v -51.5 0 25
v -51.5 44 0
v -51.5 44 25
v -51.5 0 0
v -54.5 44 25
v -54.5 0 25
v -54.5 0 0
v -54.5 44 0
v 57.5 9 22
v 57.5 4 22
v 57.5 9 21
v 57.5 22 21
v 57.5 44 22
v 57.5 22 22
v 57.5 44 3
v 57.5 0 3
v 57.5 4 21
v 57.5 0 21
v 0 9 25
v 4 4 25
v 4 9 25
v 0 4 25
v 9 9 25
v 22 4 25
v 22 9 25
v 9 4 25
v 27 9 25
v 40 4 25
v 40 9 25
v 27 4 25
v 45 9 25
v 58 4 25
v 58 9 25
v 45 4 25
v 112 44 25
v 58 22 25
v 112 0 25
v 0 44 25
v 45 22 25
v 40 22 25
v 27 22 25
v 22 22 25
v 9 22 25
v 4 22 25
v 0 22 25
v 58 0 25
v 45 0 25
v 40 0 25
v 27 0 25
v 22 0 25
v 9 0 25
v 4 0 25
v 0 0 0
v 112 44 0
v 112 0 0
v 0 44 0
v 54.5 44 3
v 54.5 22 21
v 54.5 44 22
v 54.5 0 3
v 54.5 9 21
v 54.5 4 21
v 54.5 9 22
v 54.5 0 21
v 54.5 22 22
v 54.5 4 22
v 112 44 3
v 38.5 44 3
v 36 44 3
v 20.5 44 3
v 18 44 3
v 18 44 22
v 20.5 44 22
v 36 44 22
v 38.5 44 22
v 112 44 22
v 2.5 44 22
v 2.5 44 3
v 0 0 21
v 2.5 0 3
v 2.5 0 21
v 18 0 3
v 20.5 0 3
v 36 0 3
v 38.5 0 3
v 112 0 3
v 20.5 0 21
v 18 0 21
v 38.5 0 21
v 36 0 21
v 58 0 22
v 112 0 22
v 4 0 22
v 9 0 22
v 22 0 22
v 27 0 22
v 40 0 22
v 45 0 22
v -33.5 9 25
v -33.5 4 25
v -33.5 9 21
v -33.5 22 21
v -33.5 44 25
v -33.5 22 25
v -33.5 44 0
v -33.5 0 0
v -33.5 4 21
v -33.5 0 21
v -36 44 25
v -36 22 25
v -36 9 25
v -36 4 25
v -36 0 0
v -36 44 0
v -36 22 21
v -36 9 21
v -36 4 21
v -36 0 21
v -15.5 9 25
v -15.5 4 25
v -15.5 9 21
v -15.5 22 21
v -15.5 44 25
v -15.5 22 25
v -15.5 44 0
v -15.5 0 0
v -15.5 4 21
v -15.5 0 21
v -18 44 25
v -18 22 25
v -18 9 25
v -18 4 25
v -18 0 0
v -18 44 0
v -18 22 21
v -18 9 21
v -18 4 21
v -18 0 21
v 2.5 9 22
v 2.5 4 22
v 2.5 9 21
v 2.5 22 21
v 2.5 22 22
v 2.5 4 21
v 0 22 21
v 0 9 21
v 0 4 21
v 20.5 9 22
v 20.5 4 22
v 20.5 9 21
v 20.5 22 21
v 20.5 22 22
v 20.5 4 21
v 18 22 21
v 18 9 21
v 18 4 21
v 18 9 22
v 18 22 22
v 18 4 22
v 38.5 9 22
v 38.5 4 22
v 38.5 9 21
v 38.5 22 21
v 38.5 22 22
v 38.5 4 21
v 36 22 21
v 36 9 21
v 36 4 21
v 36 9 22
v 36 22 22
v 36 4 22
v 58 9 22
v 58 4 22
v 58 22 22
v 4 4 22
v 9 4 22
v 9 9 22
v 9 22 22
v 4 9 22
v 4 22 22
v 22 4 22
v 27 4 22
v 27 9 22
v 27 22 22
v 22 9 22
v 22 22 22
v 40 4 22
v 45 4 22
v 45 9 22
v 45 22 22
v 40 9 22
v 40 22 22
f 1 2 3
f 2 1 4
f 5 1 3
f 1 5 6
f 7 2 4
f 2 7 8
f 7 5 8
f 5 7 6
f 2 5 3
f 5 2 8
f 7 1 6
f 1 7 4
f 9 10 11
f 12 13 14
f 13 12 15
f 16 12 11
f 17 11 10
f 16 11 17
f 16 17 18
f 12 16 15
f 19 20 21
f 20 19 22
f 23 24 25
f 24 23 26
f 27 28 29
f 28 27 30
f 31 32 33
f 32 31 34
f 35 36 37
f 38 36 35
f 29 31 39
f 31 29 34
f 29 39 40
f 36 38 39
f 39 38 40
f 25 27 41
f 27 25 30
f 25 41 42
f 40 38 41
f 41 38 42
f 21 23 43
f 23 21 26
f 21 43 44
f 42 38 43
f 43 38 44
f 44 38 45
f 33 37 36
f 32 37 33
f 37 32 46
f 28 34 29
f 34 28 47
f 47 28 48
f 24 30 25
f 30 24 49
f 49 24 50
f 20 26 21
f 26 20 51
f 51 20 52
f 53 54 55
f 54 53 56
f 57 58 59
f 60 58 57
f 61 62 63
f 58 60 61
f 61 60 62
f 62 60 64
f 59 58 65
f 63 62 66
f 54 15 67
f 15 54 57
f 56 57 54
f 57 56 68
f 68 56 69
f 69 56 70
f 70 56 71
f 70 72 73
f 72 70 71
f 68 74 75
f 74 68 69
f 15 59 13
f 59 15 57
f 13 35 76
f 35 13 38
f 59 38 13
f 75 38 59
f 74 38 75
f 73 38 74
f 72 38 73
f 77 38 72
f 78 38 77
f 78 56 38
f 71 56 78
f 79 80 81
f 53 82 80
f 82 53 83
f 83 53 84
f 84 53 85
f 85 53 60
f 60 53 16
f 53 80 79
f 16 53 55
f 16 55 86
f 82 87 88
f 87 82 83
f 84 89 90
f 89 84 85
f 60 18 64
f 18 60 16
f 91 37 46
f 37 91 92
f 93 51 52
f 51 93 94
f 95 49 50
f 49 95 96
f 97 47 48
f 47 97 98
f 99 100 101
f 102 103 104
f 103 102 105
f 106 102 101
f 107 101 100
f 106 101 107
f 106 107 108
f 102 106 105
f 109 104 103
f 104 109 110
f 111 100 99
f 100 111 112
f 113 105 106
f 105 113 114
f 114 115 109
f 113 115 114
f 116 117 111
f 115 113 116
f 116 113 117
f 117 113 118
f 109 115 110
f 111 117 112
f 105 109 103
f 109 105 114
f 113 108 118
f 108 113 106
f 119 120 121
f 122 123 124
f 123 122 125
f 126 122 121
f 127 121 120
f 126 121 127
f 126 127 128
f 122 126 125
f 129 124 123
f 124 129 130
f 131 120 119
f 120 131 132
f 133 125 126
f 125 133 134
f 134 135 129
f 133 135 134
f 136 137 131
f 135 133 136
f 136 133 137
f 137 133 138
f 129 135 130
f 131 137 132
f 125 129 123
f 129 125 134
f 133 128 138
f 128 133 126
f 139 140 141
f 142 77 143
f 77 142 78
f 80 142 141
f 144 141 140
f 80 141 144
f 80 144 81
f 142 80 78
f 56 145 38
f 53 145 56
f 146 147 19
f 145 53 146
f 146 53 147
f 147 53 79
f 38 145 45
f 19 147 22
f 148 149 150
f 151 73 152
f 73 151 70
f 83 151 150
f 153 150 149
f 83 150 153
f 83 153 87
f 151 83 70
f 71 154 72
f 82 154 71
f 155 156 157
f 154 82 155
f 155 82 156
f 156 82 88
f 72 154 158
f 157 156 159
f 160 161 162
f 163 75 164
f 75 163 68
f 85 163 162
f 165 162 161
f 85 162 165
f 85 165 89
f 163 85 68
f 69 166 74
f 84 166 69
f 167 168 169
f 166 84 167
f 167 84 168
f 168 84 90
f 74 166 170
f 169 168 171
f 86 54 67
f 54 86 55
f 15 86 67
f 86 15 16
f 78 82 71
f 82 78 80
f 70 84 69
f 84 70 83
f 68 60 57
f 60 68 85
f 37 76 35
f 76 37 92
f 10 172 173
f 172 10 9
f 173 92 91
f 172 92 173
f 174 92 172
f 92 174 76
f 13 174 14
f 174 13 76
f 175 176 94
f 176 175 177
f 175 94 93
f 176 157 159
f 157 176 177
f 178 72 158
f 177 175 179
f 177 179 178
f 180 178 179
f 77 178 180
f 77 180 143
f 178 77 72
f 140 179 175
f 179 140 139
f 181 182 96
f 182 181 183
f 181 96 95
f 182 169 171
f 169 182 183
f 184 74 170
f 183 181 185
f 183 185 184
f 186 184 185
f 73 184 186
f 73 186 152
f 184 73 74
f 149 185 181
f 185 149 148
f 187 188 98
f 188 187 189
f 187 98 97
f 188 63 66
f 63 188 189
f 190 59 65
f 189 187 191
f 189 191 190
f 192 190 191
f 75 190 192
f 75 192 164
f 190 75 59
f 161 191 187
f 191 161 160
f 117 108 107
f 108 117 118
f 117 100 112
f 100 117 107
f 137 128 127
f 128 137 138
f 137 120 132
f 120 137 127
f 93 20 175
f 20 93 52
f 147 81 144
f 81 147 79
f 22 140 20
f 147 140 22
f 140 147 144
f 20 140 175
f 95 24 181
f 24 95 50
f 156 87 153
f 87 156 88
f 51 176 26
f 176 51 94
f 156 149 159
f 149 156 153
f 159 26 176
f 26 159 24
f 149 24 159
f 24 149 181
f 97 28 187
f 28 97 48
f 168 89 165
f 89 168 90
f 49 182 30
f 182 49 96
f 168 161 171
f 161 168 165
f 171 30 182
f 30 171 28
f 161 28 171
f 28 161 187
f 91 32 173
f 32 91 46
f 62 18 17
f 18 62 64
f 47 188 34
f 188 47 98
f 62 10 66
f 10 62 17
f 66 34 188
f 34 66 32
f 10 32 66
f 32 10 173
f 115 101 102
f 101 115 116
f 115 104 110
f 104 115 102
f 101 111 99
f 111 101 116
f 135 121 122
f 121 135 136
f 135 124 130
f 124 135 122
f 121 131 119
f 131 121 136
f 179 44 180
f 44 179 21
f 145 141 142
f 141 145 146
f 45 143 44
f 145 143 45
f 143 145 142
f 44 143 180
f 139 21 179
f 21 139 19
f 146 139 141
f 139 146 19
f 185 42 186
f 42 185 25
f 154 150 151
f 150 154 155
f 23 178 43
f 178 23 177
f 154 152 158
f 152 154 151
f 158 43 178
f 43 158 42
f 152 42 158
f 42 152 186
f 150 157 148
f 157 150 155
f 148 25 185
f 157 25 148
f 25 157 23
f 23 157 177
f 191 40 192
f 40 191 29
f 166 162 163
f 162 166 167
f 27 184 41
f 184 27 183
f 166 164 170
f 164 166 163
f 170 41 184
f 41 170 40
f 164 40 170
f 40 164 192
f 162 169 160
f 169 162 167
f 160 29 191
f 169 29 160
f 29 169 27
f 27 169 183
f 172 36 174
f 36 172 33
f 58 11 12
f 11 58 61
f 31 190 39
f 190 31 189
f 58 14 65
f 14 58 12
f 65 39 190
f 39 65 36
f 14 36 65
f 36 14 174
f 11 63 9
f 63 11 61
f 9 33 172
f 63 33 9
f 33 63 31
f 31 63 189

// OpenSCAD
// 12-cuvette rack, printed standing on its base (z = 0 to 25)
// All dimensions in mm, measured with calipers.

// --- Plate dimensions (base & deck) ---
plate_x = 112;   // X extent of base and deck plates
plate_y = 44;    // Y extent of base and deck plates
base_t  = 3;     // base plate thickness (z 0..3)
deck_t  = 3;     // deck plate thickness (z 22..25)
deck_z  = 22;    // bottom of deck plate
total_h = 25;    // overall height of the rack

// --- Wall / rib dimensions ---
end_wall_t  = 3;    // thickness of the two end walls (along X)
rib_t       = 2.5;  // thickness of the five internal ribs (along X)
rib_x       = [-36, -18, 0, 18, 36]; // X centres of the five ribs

// --- Cuvette through-holes in the deck ---
hole_size = 13;    // 13 x 13 mm square through-holes
hole_pitch = 18;   // 18 mm centre-to-centre in both X and Y
hole_rows  = 2;    // rows along Y
hole_cols  = 6;    // columns along X

$fn = 64;

// ---------------------------------------------------------------------------
// Base plate (z 0..3), centred on origin in X and Y
// ---------------------------------------------------------------------------
module base_plate() {
    translate([0, 0, 0])
        cube([plate_x, plate_y, base_t], center = [true, true, false]);
}

// ---------------------------------------------------------------------------
// Deck plate (z 22..25), centred on origin in X and Y
// ---------------------------------------------------------------------------
module deck_plate() {
    translate([0, 0, deck_z])
        cube([plate_x, plate_y, deck_t], center = [true, true, false]);
}

// ---------------------------------------------------------------------------
// Seven upright walls, full height (z 0..25), full Y depth
// ---------------------------------------------------------------------------
module walls() { union() {
    // Two 3 mm end walls flush with the short ends
    for (sx = [-1, 1]) {
        x_c = sx * (plate_x / 2 - end_wall_t / 2);
        translate([x_c, 0, 0])
            cube([end_wall_t, plate_y, total_h], center = [true, true, false]);
    }
    // Five 2.5 mm internal ribs at the given X centres
    for (x_c = rib_x) {
        translate([x_c, 0, 0])
            cube([rib_t, plate_y, total_h], center = [true, true, false]);
    }
} }

// ---------------------------------------------------------------------------
// 12 square through-holes in the deck (2 rows x 6 cols, 18 mm pitch)
// Each cutter extends 1 mm past the top and bottom faces of the deck.
// ---------------------------------------------------------------------------
module hole_cutters() { union() {
    for (i = [0 : hole_rows - 1]) {
        y_c = (i - (hole_rows - 1) / 2) * hole_pitch;
        for (j = [0 : hole_cols - 1]) {
            x_c = (j - (hole_cols - 1) / 2) * hole_pitch;
            translate([x_c, y_c, deck_z - 1])
                cube([hole_size, hole_size, deck_t + 2], center = [true, true, false]);
        }
    }
} }

// ---------------------------------------------------------------------------
// Assemble the rack
// ---------------------------------------------------------------------------
difference() {
    union() {
        base_plate();
        deck_plate();
        walls();
    }
    hole_cutters();
}
